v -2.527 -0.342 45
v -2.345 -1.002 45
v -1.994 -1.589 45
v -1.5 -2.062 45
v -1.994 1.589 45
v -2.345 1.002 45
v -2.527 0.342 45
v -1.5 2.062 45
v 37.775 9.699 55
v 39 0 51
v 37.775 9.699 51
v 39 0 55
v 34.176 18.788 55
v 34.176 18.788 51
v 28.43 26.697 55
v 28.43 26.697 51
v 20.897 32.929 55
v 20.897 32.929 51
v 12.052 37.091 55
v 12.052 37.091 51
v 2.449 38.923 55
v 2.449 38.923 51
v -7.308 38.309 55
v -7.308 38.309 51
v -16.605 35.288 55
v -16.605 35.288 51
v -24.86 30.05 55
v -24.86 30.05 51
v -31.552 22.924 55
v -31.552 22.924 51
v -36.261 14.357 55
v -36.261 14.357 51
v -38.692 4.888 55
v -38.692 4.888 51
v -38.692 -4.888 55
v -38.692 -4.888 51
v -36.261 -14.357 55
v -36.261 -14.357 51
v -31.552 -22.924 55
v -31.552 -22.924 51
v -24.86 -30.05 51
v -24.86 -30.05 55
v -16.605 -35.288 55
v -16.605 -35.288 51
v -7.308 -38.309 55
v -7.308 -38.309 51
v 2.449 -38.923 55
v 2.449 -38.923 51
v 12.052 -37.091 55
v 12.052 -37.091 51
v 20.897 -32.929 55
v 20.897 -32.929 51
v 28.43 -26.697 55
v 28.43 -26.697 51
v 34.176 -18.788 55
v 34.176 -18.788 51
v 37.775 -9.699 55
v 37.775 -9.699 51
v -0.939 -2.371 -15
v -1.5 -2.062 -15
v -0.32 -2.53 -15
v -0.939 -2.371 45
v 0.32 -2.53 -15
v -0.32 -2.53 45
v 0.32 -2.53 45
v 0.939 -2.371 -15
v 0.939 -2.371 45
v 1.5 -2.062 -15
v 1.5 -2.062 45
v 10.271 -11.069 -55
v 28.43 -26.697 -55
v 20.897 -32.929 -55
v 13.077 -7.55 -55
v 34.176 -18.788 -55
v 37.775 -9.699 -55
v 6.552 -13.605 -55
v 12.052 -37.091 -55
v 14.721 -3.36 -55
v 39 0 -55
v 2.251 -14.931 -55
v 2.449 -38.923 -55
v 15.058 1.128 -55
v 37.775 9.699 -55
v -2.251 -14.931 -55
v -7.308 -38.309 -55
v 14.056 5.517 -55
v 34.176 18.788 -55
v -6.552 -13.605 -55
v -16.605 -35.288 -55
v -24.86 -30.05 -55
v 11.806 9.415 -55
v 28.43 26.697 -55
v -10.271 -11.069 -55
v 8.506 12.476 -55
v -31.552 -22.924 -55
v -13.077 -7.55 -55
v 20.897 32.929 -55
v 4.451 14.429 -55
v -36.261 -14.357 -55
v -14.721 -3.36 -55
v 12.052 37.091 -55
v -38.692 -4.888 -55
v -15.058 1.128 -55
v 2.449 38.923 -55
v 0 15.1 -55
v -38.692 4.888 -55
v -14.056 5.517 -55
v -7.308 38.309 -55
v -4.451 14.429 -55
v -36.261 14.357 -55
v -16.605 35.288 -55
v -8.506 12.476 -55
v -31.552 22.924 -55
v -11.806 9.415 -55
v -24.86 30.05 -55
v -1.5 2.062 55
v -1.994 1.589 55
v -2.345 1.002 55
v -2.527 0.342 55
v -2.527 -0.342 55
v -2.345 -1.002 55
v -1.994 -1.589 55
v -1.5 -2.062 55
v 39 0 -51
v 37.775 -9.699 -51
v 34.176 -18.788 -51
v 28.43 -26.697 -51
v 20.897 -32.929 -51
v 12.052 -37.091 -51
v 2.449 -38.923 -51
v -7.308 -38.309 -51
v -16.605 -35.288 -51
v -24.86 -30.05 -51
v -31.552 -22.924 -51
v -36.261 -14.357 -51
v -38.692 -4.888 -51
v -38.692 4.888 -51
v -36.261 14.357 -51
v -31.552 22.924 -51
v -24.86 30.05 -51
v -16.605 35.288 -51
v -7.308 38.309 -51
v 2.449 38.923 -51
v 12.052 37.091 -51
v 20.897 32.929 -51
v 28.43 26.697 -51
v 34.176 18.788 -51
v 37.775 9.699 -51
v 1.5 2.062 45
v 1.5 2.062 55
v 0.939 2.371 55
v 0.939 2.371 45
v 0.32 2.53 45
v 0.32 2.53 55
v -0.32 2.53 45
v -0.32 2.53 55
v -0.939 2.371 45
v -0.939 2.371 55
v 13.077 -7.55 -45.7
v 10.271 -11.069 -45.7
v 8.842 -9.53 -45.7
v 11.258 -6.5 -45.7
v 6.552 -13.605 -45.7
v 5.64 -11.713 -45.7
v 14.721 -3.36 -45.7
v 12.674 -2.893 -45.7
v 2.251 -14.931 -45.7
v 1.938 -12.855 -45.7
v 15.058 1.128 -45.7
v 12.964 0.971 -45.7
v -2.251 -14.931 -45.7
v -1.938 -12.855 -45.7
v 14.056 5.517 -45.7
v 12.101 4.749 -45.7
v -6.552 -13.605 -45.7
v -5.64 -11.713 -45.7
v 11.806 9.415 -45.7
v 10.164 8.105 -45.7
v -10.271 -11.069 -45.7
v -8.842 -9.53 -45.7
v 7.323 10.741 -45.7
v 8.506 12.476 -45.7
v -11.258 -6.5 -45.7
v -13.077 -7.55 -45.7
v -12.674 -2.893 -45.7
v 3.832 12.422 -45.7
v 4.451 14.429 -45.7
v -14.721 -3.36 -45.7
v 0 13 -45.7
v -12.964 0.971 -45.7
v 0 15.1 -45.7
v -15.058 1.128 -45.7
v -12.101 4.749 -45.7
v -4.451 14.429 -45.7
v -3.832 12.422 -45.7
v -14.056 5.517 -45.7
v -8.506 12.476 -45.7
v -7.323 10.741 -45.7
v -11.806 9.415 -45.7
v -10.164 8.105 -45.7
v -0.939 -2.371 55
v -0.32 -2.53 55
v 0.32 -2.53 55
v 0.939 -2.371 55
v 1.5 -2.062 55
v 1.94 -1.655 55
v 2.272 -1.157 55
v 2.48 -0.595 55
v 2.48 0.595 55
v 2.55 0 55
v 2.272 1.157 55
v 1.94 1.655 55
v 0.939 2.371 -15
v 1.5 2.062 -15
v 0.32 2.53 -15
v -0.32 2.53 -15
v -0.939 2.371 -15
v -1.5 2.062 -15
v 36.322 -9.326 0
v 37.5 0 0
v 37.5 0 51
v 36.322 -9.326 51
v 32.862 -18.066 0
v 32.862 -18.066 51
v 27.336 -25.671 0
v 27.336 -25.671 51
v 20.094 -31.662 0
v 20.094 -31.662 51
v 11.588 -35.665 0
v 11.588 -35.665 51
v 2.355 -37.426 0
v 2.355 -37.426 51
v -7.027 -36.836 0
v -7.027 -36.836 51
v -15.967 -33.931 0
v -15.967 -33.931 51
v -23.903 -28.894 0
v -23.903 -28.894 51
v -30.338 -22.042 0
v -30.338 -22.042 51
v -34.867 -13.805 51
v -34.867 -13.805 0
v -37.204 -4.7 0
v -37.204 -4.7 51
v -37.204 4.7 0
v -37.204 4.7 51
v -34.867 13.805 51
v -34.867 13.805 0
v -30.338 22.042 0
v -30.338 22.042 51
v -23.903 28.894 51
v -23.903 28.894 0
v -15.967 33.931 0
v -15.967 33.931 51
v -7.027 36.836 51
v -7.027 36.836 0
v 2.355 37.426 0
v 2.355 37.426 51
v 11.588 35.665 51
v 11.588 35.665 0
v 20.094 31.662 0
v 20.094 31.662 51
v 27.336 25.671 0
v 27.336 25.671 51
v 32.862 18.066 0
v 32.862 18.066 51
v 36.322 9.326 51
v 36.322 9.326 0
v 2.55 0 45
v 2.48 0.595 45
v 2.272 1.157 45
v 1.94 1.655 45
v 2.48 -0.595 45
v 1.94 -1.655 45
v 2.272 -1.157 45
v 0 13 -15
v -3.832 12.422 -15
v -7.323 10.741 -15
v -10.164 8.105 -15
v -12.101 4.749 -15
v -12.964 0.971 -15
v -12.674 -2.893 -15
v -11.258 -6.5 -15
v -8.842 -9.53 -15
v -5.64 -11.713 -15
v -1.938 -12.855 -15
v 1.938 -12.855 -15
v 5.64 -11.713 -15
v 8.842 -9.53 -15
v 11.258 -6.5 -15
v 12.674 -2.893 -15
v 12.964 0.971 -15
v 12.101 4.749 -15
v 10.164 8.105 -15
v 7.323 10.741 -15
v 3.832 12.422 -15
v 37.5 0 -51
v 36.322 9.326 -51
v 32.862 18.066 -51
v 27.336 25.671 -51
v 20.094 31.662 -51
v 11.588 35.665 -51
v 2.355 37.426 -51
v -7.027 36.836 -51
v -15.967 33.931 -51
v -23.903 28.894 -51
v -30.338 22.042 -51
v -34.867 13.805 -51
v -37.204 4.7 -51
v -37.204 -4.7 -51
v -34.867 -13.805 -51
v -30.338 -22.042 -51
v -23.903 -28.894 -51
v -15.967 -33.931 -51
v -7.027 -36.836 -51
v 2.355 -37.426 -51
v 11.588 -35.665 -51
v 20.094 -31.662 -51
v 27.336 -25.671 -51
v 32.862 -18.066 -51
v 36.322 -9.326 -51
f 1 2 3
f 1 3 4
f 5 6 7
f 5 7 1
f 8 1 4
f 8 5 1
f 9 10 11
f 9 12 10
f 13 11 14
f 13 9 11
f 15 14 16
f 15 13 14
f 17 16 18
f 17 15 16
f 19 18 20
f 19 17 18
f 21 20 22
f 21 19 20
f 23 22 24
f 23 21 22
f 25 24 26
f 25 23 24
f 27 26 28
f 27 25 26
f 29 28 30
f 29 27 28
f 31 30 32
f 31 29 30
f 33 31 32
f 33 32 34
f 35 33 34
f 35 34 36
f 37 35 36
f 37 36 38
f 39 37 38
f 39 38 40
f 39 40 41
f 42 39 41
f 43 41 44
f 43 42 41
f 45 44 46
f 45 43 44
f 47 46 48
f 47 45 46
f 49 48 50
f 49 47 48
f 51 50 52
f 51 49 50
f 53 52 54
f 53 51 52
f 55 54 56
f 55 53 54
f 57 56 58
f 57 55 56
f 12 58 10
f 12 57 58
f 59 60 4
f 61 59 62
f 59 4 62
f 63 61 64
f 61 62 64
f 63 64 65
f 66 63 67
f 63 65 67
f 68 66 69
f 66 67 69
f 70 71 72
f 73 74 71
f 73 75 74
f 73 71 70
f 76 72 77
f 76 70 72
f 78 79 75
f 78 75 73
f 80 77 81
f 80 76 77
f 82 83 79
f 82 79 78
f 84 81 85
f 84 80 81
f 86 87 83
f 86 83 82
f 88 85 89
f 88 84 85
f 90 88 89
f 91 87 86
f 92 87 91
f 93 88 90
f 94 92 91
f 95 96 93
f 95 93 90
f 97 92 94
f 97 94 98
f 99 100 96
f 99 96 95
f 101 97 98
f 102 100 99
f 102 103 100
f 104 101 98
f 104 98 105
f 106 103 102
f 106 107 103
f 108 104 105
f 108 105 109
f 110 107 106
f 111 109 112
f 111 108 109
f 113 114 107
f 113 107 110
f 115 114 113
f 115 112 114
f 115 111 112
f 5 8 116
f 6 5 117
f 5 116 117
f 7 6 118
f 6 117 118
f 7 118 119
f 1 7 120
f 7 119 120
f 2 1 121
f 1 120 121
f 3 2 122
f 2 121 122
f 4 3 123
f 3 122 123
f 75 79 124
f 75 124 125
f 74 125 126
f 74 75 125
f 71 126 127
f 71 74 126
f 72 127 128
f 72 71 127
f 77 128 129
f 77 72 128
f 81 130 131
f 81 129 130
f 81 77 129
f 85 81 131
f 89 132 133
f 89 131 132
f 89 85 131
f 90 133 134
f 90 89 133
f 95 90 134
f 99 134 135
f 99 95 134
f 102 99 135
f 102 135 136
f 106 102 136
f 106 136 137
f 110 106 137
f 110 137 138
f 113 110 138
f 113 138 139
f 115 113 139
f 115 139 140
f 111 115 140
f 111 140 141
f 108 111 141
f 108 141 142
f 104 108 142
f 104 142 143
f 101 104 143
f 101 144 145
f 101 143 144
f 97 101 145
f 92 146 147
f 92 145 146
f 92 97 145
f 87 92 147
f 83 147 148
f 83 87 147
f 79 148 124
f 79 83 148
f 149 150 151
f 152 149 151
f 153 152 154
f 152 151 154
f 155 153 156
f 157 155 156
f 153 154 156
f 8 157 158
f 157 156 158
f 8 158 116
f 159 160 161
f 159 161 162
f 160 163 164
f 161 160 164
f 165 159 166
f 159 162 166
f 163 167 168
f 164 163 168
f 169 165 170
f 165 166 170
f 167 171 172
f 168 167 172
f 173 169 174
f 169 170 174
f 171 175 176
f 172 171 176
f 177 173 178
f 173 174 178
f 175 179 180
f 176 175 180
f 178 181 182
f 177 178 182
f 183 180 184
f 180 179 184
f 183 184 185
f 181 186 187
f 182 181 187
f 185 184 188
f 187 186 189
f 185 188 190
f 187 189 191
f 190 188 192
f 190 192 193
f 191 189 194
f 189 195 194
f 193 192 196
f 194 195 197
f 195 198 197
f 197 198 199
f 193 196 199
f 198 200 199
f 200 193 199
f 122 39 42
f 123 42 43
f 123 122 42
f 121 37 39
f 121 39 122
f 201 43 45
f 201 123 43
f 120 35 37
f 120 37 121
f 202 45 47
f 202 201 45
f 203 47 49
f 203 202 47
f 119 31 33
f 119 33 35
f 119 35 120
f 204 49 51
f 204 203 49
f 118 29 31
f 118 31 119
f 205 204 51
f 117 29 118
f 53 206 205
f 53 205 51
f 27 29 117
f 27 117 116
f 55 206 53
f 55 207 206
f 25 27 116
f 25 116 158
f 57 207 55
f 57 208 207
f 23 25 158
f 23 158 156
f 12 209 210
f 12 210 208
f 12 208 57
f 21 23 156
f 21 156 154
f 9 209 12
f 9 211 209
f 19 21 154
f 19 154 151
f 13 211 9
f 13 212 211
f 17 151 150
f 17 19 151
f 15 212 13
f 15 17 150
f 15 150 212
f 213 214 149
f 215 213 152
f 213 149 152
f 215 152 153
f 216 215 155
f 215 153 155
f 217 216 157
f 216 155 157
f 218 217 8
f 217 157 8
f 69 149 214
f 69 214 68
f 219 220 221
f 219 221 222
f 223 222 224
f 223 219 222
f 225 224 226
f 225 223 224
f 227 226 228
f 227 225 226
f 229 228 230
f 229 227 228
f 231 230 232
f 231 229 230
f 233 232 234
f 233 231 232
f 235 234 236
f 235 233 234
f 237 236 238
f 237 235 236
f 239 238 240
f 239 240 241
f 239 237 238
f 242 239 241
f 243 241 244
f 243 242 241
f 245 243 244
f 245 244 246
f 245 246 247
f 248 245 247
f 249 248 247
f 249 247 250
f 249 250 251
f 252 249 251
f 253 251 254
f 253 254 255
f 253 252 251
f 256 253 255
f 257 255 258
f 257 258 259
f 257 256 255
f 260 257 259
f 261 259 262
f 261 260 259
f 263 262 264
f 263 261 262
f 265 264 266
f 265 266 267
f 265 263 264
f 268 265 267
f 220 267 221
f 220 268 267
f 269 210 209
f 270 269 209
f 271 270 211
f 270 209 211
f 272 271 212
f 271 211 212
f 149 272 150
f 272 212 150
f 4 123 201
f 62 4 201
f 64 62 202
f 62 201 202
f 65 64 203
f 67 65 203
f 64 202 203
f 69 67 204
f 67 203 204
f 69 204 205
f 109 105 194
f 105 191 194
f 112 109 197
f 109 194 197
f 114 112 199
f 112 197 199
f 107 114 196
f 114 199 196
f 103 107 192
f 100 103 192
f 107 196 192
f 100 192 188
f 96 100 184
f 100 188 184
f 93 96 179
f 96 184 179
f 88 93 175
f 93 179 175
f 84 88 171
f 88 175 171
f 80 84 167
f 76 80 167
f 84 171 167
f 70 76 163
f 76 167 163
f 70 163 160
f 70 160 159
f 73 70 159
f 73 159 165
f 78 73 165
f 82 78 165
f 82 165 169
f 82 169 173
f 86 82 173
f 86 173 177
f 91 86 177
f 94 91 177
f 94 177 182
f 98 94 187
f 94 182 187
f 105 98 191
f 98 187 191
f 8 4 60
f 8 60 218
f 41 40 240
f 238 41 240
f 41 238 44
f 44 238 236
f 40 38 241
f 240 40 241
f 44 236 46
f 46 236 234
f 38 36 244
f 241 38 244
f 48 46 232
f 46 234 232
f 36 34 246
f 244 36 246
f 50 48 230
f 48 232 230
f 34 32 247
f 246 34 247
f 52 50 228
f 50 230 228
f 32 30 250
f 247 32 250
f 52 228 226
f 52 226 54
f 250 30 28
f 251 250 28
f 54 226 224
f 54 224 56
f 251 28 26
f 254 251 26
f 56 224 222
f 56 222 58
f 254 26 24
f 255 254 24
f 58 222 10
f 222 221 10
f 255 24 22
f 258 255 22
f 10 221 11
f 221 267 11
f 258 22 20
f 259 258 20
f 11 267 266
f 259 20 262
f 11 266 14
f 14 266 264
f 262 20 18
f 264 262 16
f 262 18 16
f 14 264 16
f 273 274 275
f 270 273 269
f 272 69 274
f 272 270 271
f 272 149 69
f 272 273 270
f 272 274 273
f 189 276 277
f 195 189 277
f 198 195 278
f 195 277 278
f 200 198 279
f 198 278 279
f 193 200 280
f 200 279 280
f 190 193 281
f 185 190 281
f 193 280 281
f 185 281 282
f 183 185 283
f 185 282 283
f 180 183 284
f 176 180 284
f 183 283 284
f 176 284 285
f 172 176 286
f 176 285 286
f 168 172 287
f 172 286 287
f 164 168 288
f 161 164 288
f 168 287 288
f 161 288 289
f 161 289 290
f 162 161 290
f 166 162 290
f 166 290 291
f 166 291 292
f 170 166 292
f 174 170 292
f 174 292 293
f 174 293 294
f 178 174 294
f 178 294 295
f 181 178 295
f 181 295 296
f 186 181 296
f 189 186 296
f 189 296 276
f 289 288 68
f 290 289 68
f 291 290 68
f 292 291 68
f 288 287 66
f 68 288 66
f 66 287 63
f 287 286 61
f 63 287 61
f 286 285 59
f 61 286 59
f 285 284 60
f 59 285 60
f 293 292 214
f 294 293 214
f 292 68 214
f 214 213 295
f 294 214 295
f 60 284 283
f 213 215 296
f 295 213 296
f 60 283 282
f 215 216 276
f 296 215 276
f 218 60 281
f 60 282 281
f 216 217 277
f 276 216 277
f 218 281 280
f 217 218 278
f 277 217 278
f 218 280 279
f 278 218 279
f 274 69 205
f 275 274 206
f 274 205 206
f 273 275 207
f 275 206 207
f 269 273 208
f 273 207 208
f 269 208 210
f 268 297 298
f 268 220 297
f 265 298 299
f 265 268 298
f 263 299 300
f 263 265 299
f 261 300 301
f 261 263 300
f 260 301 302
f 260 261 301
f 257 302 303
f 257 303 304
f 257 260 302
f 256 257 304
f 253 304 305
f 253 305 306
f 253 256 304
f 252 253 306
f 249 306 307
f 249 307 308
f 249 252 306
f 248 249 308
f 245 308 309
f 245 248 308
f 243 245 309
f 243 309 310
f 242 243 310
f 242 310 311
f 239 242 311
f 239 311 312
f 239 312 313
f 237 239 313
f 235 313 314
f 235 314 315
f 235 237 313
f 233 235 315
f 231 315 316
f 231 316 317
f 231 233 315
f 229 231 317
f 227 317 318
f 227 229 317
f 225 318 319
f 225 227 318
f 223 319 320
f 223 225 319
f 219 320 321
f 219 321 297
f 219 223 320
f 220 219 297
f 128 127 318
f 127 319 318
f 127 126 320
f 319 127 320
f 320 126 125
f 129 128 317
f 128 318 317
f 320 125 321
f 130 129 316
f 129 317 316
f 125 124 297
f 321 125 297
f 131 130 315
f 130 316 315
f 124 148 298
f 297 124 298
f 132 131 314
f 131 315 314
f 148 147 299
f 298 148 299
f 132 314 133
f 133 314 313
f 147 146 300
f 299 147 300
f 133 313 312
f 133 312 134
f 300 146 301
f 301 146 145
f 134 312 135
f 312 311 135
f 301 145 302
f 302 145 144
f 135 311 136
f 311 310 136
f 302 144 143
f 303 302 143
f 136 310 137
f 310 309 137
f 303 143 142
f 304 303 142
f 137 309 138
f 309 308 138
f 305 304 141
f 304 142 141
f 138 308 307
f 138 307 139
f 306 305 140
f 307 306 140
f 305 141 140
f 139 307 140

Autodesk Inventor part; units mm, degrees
ref_plane "YZ Plane" through (0, 0, 0) normal (1, 0, 0) x (0, 1, 0)
ref_plane "XZ Plane" through (0, 0, 0) normal (0, 1, 0) x (-1, 0, 0)
ref_plane "XY Plane" through (0, 0, 0) normal (0, 0, 1) x (1, 0, 0)
sketch "Sketch1" plane through (0, 0, 0) normal (0, 0, 1) x (1, 0, 0)
  circle A0 centre (0, 0) radius 37.5
  dimension "d0" = 75
extrude "Extrusion1" add sketch "Sketch1" along normal mid plane 110
sketch "Sketch5" plane through (0, 0, 55) normal (0, 0, 1) x (1, 0, 0)
  circle A0 centre (0, 0) radius 39
  dimension "d22" = 78
extrude "Extrusion4" add sketch "Sketch5" against normal blind 4
mirror "Mirror2" about plane through (0, 0, 0) normal (0, 0, 1) of "Extrusion4"
sketch "Sketch4" plane through (0, 0, -55) normal (0, 0, -1) x (-1, 0, 0)
  point P0 (0, 0)
  point P1 (0, 0)
hole "Hole1" at (0, 0, -55) direction (0, 0, 1) diameter 26 depth 40 counterbore diameter 30.2 counterbore depth 9.3
sketch "Sketch6" plane through (0, 0, 55) normal (0, 0, 1) x (1, 0, 0)
  circle A0 centre (0, 0) radius 2.55
  dimension "d25" = 5.1
extrude "Extrusion5" cut sketch "Sketch6" against normal blind 10
sketch "Sketch7" plane through (0, 0, 55) normal (0, 0, 1) x (1, 0, 0)
  circle A0 centre (0, 0) radius 2.55 projected
  line L0 (-1.5, -2.0622) -> (-1.5, 2.0622)
  line L1 (1.5, 2.0622) -> (1.5, -2.0622)
  arc A1 (-1.5, -2.0622) -> (1.5, -2.0622) centre (0, 0) ccw
  arc A2 (1.5, 2.0622) -> (-1.5, 2.0622) centre (0, 0) ccw
  dimension "d28" = 1.5
extrude "Extrusion6" cut sketch "Sketch7" against normal through all contours L1 A0 L0
properties part number "13042026-14"
